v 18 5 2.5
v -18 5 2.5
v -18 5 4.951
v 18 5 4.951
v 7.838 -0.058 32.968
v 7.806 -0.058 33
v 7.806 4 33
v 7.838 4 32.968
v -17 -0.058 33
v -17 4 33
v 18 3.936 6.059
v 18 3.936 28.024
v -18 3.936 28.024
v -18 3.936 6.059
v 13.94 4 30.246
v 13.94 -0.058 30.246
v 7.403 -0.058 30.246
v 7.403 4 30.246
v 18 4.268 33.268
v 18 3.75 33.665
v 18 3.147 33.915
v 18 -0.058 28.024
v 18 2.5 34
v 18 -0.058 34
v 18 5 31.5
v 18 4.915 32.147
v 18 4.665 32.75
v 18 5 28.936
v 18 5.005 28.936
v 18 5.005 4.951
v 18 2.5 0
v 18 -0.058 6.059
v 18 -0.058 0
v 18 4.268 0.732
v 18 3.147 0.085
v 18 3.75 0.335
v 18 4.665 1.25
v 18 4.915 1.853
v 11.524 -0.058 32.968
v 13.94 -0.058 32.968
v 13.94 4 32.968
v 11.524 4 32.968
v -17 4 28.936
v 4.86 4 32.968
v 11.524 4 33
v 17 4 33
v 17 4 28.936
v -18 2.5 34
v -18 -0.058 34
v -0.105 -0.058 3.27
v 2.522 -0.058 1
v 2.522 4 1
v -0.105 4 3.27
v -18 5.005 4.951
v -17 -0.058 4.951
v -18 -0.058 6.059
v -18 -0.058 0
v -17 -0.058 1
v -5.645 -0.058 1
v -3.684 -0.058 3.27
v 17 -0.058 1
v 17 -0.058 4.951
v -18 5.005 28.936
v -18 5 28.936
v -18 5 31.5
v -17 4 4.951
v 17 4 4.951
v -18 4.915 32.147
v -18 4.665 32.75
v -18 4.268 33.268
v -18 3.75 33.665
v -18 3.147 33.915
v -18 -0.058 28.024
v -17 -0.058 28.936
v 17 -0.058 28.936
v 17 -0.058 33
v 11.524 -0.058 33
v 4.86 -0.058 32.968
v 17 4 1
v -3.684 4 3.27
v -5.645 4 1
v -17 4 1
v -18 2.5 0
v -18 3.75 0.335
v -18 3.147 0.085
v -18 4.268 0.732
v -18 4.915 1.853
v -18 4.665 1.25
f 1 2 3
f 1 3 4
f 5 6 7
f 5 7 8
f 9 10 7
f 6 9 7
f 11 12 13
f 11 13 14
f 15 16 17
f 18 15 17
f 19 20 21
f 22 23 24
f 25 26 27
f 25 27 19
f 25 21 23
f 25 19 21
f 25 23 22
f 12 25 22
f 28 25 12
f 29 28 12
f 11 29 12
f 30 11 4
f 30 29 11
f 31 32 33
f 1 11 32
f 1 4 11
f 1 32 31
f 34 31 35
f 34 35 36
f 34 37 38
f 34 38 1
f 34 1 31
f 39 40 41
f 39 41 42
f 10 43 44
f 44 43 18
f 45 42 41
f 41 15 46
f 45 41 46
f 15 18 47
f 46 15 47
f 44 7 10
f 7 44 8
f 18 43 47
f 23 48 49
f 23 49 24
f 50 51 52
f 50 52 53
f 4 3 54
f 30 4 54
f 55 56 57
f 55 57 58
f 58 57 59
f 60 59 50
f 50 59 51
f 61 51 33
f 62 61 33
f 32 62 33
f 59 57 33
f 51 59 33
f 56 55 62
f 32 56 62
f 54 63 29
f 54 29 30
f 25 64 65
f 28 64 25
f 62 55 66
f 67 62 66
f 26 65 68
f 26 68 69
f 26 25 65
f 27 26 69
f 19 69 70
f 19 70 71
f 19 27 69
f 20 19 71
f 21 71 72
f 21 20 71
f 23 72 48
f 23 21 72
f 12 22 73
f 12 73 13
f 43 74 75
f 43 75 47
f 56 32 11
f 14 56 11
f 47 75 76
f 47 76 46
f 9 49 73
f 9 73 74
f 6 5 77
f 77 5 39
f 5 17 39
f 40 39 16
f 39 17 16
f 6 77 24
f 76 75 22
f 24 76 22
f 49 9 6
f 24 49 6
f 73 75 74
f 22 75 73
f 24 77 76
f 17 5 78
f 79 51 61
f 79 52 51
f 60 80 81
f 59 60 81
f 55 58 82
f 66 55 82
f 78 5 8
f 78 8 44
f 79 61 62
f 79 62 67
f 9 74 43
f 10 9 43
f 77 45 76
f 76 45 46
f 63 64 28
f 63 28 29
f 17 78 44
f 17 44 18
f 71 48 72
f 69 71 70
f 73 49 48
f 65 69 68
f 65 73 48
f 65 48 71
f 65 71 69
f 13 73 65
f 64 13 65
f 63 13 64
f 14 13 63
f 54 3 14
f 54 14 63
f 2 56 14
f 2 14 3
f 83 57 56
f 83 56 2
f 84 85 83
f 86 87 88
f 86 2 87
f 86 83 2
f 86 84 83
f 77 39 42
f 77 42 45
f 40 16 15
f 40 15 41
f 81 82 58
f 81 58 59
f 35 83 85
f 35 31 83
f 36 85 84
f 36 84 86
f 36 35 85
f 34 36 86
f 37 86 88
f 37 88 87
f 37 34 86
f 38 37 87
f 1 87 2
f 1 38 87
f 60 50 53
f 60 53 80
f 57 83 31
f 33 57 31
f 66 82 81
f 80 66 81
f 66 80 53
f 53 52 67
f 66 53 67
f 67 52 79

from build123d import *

# Parameters (mm, degrees)
SKETCH_3_W                      = 36
SKETCH_3_H                      = 10
EXTRUDE_1_DEPTH                 = 34
SHELL_1_T                       = -1
EXTRUDE_3_DEPTH                 = 18
EXTRUDE_3_DEPTH_BACK            = 18
SKETCH_4_W                      = 23.985162527
SKETCH_4_H                      = 5.996290528
FILLET_9_R                      = 2.5
EXTRUDE_6_DEPTH                 = 4
EXTRUDE_6_DEPTH_BACK            = 3.2
EXTRUDE_7_DEPTH                 = 4
EXTRUDE_7_DEPTH_BACK            = 3.2
FILLET_11_R                     = 2.5
EXTRUDE_START                   = -5
EXTRUDE_8_DEPTH                 = 9
CUT_EXTRUDE_START               = 17
SKETCH_8_W                      = 9.2
SKETCH_8_H                      = 1.40146724
CUT_EXTRUDE_3_DEPTH             = 0.5
CUT_EXTRUDE_4_REACH             = 40.795
SKETCH_11_W                     = 21.965454815
SKETCH_11_H                     = 3.993719057
CUT_EXTRUDE_4_DIRECTION_2_REACH = 40.795
SKETCH_10_W                     = 1.1
SKETCH_10_H                     = 7.7
SKETCH_10_W_2                   = 1.122304396
SKETCH_10_W_3                   = 1.111152198
SKETCH_10_W_4                   = 1.088342312
SKETCH_10_W_5                   = 1.094171156
CUT_EXTRUDE_5_DEPTH             = 0.991590454
SPLIT_START                     = -5
SPLIT_BODIES_2_OUTLINE_W        = 36
SPLIT_BODIES_2_OUTLINE_H        = 34
SPLIT_BODIES_2_OUTLINE_W_2      = 1.1
SPLIT_BODIES_2_OUTLINE_H_2      = 7.7
SPLIT_BODIES_2_OUTLINE_W_3      = 1.111152198
SPLIT_BODIES_2_OUTLINE_W_4      = 1.094171156
SPLIT_BODIES_2_OUTLINE_W_5      = 1.122304396
SPLIT_BODIES_2_OUTLINE_W_6      = 1.088342312
SPLIT_BODIES_2_DEPTH            = 4.942187478


# Read off the part's stored shape, not the designer's step: 分割1, 分割2
with BuildPart() as part:
    # 草图3 → 凸台-拉伸1 (new body)
    with BuildSketch(Plane.XY):
        Rectangle(SKETCH_3_W, SKETCH_3_H)
    extrude(amount=EXTRUDE_1_DEPTH)

    # 抽壳1
    shell_1_openings = [part.faces().sort_by_distance(p)[0] for p in [
        (0, -5, 17),
    ]]
    offset(amount=SHELL_1_T, openings=shell_1_openings, kind=Kind.INTERSECTION)

    # 草图4 → 凸台-拉伸3 (add, two sides: drawn at the far end of the back side and taken through both)
    with BuildSketch(Plane(origin=(0, 0, 0), x_dir=(0, 0, -1), z_dir=(1, 0, 0)).offset(-EXTRUDE_3_DEPTH_BACK)):
        with Locations((-16.943109173, 2.00655481)):
            Rectangle(SKETCH_4_W, SKETCH_4_H)
    extrude(amount=EXTRUDE_3_DEPTH + EXTRUDE_3_DEPTH_BACK)

    # 圆角9
    fillet_9_edges = [part.edges().sort_by_distance(p)[0] for p in [
        (0, 5, 34),
    ]]
    fillet(fillet_9_edges, radius=FILLET_9_R)

    # 草图6 → 凸台-拉伸6 (add, two sides: drawn at the far end of the back side and taken through both)
    with BuildSketch(Plane(origin=(0, 0, 0), x_dir=(1, 0, 0), z_dir=(0, 1, 0)).offset(-EXTRUDE_6_DEPTH_BACK)):
        Polygon((4.859681811, -32.9683063), (7.403408748, -30.245536487), (12.359177608, -30.245536487), (13.940012235, -30.245536487), (13.940012235, -32.9683063), align=None)
    extrude(amount=EXTRUDE_6_DEPTH + EXTRUDE_6_DEPTH_BACK)

    # 草图7 → 凸台-拉伸7 (add, two sides: drawn at the far end of the back side and taken through both)
    with BuildSketch(Plane(origin=(0, 0, 0), x_dir=(1, 0, 0), z_dir=(0, 1, 0)).offset(-EXTRUDE_7_DEPTH_BACK)):
        Polygon((2.54458171, -0.980815803), (-0.105019187, -3.27043557), (-3.683509766, -3.27043557), (-5.662056301, -0.980815803), align=None)
    extrude(amount=EXTRUDE_7_DEPTH + EXTRUDE_7_DEPTH_BACK)

    # 圆角11
    fillet_11_edges = [part.edges().sort_by_distance(p)[0] for p in [
        (0, 5, 0),
    ]]
    fillet(fillet_11_edges, radius=FILLET_11_R)

    # 草图5 → 凸台-拉伸8 (add)
    with BuildSketch(Plane(origin=(0, 0, 0), x_dir=(1, 0, 0), z_dir=(0, 1, 0)).offset(EXTRUDE_START)):
        Polygon((-3.212354085, -1), (-2.299075535, -1.958092867), (-1.257675535, -1.958092867), (-0.046128087, -1), align=None)
        Polygon((7.806276899, -33), (8.868785029, -31.937293749), (11.523785029, -31.937293749), (11.523785029, -33), align=None)
    extrude(amount=EXTRUDE_8_DEPTH)

    # 草图8 → 切除-拉伸3 (cut)
    with BuildSketch(Plane(origin=(0, 0, 0), x_dir=(0, 0, -1), z_dir=(1, 0, 0)).offset(CUT_EXTRUDE_START)):
        with Locations((-26.021321233, -4.299270344)):
            Rectangle(SKETCH_8_W, SKETCH_8_H)
    extrude(amount=CUT_EXTRUDE_3_DEPTH, mode=Mode.SUBTRACT)

    # 切除-拉伸4: up to this face of the body (flat: up to its plane)
    cut_extrude_4_end = Plane(part.part.faces().sort_by_distance((-18, -0.033638706, 16.999980993))[0])
    # 草图11 → 切除-拉伸4 (cut, up to the picked face)
    with BuildSketch(Plane(origin=(0, 0, 0), x_dir=(0, 0, -1), z_dir=(1, 0, 0)), mode=Mode.PRIVATE) as cut_extrude_4_sk1:
        with Locations((-17.041422709, 1.939047007)):
            Rectangle(SKETCH_11_W, SKETCH_11_H)
    cut_extrude_4_tool1 = split(extrude(cut_extrude_4_sk1.sketch, amount=-CUT_EXTRUDE_4_REACH, mode=Mode.PRIVATE), bisect_by=cut_extrude_4_end, keep=Keep.BOTH, mode=Mode.PRIVATE)
    add(cut_extrude_4_tool1.solids().sort_by(Axis((0, 1.939047, 17.041423), (-1, 0, 0)))[0], mode=Mode.SUBTRACT)

    # 切除-拉伸4 direction 2: up to this face of the body (flat: up to its plane)
    cut_extrude_4_direction_2_end = Plane(part.part.faces().sort_by_distance((18, -0.033638706, 16.999980993))[0])
    # 草图11 → 切除-拉伸4 direction 2 (cut, up to the picked face)
    with BuildSketch(Plane(origin=(0, 0, 0), x_dir=(0, 0, -1), z_dir=(1, 0, 0)), mode=Mode.PRIVATE) as cut_extrude_4_direction_2_sk1:
        with Locations((-17.041422709, 1.939047007)):
            Rectangle(SKETCH_11_W, SKETCH_11_H)
    cut_extrude_4_direction_2_tool1 = split(extrude(cut_extrude_4_direction_2_sk1.sketch, amount=CUT_EXTRUDE_4_DIRECTION_2_REACH, mode=Mode.PRIVATE), bisect_by=cut_extrude_4_direction_2_end, keep=Keep.BOTH, mode=Mode.PRIVATE)
    add(cut_extrude_4_direction_2_tool1.solids().sort_by(Axis((0, 1.939047, 17.041423), (1, 0, 0)))[0], mode=Mode.SUBTRACT)

    # 草图10 → 切除-拉伸5 (cut)
    with BuildSketch(Plane(origin=(0, 0, 0), x_dir=(1, 0, 0), z_dir=(0, 1, 0))):
        with Locations((-10.631432442, -10.52972417)):
            Rectangle(SKETCH_10_W, SKETCH_10_H)
        with Locations((-10.631432442, -20.605915071)):
            Rectangle(SKETCH_10_W, SKETCH_10_H)
        with Locations((10.829939073, -20.605915071)):
            Rectangle(SKETCH_10_W, SKETCH_10_H)
        with Locations((10.829939073, -10.52972417)):
            Rectangle(SKETCH_10_W, SKETCH_10_H)
        with Locations((-6.938026669, -10.52972417)):
            Rectangle(SKETCH_10_W_2, SKETCH_10_H)
        with Locations((-6.943602768, -20.605915071)):
            Rectangle(SKETCH_10_W_3, SKETCH_10_H)
        with Locations((7.321076066, -10.52972417)):
            Rectangle(SKETCH_10_W_4, SKETCH_10_H)
        with Locations((7.323990488, -20.605915071)):
            Rectangle(SKETCH_10_W_5, SKETCH_10_H)
    extrude(amount=-CUT_EXTRUDE_5_DEPTH, mode=Mode.SUBTRACT)


with BuildPart() as body_2:
    # Split Bodies 1: the piece on the far side of the plane
    add(part.part)
    split(bisect_by=Plane(origin=(0, -0.057812522, 0), x_dir=(1, 0, 0), z_dir=(0, 1, 0)), keep=Keep.BOTTOM)

    # Split Bodies 2 outline → Split Bodies 2 (cut)
    with BuildSketch(Plane(origin=(0, 0, 0), x_dir=(1, 0, 0), z_dir=(0, 1, 0)).offset(SPLIT_START)):
        with Locations((0, -17)):
            Rectangle(SPLIT_BODIES_2_OUTLINE_W, SPLIT_BODIES_2_OUTLINE_H)
        Polygon((-17, -28.935690436), (17, -28.935690436), (17, -33), (11.523785029, -33), (11.523785029, -32.9683063), (13.940012235, -32.9683063), (13.940012235, -30.245536487), (7.403408748, -30.245536487), (4.859681811, -32.9683063), (7.83796469, -32.9683063), (7.806276899, -33), (-17, -33), align=None, mode=Mode.SUBTRACT)
        Polygon((17, -4.950527909), (-17, -4.950527909), (-17, -1), (-5.645478515, -1), (-3.683509766, -3.27043557), (-0.105019187, -3.27043557), (2.522381315, -1), (17, -1), align=None, mode=Mode.SUBTRACT)
        with Locations((-10.631432442, -20.605915071)):
            Rectangle(SPLIT_BODIES_2_OUTLINE_W_2, SPLIT_BODIES_2_OUTLINE_H_2, mode=Mode.SUBTRACT)
        with Locations((-6.943602768, -20.605915071)):
            Rectangle(SPLIT_BODIES_2_OUTLINE_W_3, SPLIT_BODIES_2_OUTLINE_H_2, mode=Mode.SUBTRACT)
        with Locations((7.323990488, -20.605915071)):
            Rectangle(SPLIT_BODIES_2_OUTLINE_W_4, SPLIT_BODIES_2_OUTLINE_H_2, mode=Mode.SUBTRACT)
        with Locations((10.829939073, -20.605915071)):
            Rectangle(SPLIT_BODIES_2_OUTLINE_W_2, SPLIT_BODIES_2_OUTLINE_H_2, mode=Mode.SUBTRACT)
        with Locations((-10.631432442, -10.52972417)):
            Rectangle(SPLIT_BODIES_2_OUTLINE_W_2, SPLIT_BODIES_2_OUTLINE_H_2, mode=Mode.SUBTRACT)
        with Locations((-6.938026669, -10.52972417)):
            Rectangle(SPLIT_BODIES_2_OUTLINE_W_5, SPLIT_BODIES_2_OUTLINE_H_2, mode=Mode.SUBTRACT)
        with Locations((7.321076066, -10.52972417)):
            Rectangle(SPLIT_BODIES_2_OUTLINE_W_6, SPLIT_BODIES_2_OUTLINE_H_2, mode=Mode.SUBTRACT)
        with Locations((10.829939073, -10.52972417)):
            Rectangle(SPLIT_BODIES_2_OUTLINE_W_2, SPLIT_BODIES_2_OUTLINE_H_2, mode=Mode.SUBTRACT)
    extrude(amount=SPLIT_BODIES_2_DEPTH, mode=Mode.SUBTRACT)


with BuildPart() as part_1:
    add(part.part)

    # Split Bodies 1
    split(bisect_by=Plane(origin=(0, -0.057812522, 0), x_dir=(1, 0, 0), z_dir=(0, 1, 0)), keep=Keep.TOP)


solid = part_1.part
